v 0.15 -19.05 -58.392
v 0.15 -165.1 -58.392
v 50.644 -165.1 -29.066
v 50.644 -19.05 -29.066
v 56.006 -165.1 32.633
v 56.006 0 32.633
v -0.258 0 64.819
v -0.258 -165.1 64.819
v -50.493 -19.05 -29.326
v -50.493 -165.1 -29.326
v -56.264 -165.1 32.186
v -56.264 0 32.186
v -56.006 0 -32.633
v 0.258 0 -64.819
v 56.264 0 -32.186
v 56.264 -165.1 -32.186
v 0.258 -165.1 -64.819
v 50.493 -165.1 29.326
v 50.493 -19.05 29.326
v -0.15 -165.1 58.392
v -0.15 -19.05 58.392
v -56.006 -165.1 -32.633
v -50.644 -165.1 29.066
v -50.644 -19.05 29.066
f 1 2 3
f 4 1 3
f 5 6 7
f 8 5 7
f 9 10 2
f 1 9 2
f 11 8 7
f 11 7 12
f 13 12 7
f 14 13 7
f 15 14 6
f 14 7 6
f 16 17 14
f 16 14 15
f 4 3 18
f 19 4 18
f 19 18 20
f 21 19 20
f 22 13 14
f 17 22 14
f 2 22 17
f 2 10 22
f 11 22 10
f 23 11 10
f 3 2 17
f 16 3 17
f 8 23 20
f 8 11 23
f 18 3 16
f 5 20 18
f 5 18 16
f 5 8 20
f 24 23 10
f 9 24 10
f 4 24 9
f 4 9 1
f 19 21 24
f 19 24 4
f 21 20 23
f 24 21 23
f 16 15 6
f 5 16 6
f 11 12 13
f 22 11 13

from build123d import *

# Parameters (mm, degrees)
F1_DEPTH = 165.1
F2_DEPTH = 127
F4_DEPTH = 146.05


# Not quite as in the source:
# - a feature names something its author has since deleted; it is built from what else it names


with BuildPart() as f1:
    # F0 (on Front) → F1 (new body)
    with BuildSketch(Plane.XZ):
        Polygon((-0.2583676879, 64.8191452859), (-56.2642103132, 32.1858196618), (-56.0058426253, -32.6333256242), (0.2583676879, -64.8191452859), (56.2642103132, -32.1858196618), (56.0058426253, 32.6333256242), align=None)
    extrude(amount=F1_DEPTH)

    # F0 (on Front) → F2 (join)
    with BuildSketch(Plane.XZ):
        Polygon((-0.2583676879, 64.8191452859), (-56.2642103132, 32.1858196618), (-56.0058426253, -32.6333256242), (0.2583676879, -64.8191452859), (56.2642103132, -32.1858196618), (56.0058426253, 32.6333256242), align=None)
    extrude(amount=F2_DEPTH)

    # F3 (on face) → F4 (cut)
    with BuildSketch(Plane.XZ.offset(165.1)):
        Polygon((-0.1502408993, 58.3915630752), (-50.6436974394, 29.0656691021), (-50.4934565401, -29.3258939731), (0.1502408993, -58.3915630752), (50.6436974394, -29.0656691021), (50.4934565401, 29.3258939731), align=None)
    extrude(amount=-F4_DEPTH, mode=Mode.SUBTRACT)


solid = f1.part
